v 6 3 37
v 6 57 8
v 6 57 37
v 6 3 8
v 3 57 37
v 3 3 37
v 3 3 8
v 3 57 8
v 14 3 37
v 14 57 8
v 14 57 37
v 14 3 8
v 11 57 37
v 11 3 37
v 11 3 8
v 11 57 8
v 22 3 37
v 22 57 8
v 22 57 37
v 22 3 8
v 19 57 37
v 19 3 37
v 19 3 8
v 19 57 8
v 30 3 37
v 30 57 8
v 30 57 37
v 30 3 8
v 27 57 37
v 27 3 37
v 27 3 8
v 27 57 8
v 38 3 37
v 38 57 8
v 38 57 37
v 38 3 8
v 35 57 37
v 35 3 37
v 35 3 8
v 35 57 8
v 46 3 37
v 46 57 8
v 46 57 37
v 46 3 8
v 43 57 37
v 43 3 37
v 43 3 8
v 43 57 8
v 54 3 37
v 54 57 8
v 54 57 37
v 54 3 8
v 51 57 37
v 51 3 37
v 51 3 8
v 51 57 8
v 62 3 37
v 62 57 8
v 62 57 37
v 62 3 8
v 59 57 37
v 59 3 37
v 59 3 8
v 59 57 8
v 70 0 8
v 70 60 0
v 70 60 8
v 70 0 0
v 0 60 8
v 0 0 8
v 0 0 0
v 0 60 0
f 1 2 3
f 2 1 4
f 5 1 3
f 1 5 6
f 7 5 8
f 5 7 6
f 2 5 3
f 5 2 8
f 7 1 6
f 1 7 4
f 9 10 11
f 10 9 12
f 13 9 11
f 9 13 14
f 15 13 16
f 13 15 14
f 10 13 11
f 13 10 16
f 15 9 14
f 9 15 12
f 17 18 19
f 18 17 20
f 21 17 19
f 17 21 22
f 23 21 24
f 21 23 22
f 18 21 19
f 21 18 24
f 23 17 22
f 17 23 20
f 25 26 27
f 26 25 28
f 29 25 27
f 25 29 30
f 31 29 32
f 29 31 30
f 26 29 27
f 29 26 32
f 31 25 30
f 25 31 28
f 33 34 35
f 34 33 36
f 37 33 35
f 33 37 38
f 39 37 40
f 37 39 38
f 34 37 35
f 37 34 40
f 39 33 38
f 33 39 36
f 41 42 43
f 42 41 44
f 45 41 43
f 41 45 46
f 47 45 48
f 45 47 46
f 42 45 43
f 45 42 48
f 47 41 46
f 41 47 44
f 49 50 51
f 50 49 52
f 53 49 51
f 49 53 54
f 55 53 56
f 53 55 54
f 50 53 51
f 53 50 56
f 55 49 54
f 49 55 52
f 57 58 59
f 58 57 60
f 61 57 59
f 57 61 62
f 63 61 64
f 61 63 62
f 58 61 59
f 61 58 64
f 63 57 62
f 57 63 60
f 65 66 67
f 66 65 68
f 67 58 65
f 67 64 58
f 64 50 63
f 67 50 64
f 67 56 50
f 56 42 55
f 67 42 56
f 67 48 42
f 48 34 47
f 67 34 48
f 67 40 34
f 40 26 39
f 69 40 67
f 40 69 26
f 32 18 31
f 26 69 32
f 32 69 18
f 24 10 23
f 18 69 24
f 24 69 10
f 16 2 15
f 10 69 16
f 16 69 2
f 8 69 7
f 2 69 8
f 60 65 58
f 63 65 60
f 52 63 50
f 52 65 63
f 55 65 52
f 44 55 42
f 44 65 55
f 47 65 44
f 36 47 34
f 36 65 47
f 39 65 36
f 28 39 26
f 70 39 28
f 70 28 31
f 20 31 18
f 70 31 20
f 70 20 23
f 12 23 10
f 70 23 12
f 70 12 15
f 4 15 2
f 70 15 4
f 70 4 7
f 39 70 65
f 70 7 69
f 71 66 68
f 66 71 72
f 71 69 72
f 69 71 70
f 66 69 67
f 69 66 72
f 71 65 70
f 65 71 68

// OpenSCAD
$fn = 32;

// ----------------------------------------------------------------------
// Heatsink: uniform fin block
// ----------------------------------------------------------------------

// --- parameters (mm) ---
base_l = 70;              // base length, X
base_w = 60;              // base width, Y
base_t = 8;               // base plate thickness
fin_h = 30;               // fin height above the base
fin_t = 3;                // fin thickness
edge = 3;                 // margin from the base ends
pitch = 8;                // fin pitch
fit_tol = 0.02;           // tolerance for press fits, mm
free_tol = 0.2;           // tolerance for clearance fits, mm

n_fins = floor((base_l - 2 * edge - fin_t) / pitch) + 1;  // fin count
total_h = base_t + fin_h - 1;  // overall height

union() {
  cube([base_l, base_w, base_t]);
  for (i = [0 : n_fins - 1])
    translate([edge + i * pitch, edge, base_t - 1])
      cube([fin_t, base_w - 2 * edge, fin_h]);
}
